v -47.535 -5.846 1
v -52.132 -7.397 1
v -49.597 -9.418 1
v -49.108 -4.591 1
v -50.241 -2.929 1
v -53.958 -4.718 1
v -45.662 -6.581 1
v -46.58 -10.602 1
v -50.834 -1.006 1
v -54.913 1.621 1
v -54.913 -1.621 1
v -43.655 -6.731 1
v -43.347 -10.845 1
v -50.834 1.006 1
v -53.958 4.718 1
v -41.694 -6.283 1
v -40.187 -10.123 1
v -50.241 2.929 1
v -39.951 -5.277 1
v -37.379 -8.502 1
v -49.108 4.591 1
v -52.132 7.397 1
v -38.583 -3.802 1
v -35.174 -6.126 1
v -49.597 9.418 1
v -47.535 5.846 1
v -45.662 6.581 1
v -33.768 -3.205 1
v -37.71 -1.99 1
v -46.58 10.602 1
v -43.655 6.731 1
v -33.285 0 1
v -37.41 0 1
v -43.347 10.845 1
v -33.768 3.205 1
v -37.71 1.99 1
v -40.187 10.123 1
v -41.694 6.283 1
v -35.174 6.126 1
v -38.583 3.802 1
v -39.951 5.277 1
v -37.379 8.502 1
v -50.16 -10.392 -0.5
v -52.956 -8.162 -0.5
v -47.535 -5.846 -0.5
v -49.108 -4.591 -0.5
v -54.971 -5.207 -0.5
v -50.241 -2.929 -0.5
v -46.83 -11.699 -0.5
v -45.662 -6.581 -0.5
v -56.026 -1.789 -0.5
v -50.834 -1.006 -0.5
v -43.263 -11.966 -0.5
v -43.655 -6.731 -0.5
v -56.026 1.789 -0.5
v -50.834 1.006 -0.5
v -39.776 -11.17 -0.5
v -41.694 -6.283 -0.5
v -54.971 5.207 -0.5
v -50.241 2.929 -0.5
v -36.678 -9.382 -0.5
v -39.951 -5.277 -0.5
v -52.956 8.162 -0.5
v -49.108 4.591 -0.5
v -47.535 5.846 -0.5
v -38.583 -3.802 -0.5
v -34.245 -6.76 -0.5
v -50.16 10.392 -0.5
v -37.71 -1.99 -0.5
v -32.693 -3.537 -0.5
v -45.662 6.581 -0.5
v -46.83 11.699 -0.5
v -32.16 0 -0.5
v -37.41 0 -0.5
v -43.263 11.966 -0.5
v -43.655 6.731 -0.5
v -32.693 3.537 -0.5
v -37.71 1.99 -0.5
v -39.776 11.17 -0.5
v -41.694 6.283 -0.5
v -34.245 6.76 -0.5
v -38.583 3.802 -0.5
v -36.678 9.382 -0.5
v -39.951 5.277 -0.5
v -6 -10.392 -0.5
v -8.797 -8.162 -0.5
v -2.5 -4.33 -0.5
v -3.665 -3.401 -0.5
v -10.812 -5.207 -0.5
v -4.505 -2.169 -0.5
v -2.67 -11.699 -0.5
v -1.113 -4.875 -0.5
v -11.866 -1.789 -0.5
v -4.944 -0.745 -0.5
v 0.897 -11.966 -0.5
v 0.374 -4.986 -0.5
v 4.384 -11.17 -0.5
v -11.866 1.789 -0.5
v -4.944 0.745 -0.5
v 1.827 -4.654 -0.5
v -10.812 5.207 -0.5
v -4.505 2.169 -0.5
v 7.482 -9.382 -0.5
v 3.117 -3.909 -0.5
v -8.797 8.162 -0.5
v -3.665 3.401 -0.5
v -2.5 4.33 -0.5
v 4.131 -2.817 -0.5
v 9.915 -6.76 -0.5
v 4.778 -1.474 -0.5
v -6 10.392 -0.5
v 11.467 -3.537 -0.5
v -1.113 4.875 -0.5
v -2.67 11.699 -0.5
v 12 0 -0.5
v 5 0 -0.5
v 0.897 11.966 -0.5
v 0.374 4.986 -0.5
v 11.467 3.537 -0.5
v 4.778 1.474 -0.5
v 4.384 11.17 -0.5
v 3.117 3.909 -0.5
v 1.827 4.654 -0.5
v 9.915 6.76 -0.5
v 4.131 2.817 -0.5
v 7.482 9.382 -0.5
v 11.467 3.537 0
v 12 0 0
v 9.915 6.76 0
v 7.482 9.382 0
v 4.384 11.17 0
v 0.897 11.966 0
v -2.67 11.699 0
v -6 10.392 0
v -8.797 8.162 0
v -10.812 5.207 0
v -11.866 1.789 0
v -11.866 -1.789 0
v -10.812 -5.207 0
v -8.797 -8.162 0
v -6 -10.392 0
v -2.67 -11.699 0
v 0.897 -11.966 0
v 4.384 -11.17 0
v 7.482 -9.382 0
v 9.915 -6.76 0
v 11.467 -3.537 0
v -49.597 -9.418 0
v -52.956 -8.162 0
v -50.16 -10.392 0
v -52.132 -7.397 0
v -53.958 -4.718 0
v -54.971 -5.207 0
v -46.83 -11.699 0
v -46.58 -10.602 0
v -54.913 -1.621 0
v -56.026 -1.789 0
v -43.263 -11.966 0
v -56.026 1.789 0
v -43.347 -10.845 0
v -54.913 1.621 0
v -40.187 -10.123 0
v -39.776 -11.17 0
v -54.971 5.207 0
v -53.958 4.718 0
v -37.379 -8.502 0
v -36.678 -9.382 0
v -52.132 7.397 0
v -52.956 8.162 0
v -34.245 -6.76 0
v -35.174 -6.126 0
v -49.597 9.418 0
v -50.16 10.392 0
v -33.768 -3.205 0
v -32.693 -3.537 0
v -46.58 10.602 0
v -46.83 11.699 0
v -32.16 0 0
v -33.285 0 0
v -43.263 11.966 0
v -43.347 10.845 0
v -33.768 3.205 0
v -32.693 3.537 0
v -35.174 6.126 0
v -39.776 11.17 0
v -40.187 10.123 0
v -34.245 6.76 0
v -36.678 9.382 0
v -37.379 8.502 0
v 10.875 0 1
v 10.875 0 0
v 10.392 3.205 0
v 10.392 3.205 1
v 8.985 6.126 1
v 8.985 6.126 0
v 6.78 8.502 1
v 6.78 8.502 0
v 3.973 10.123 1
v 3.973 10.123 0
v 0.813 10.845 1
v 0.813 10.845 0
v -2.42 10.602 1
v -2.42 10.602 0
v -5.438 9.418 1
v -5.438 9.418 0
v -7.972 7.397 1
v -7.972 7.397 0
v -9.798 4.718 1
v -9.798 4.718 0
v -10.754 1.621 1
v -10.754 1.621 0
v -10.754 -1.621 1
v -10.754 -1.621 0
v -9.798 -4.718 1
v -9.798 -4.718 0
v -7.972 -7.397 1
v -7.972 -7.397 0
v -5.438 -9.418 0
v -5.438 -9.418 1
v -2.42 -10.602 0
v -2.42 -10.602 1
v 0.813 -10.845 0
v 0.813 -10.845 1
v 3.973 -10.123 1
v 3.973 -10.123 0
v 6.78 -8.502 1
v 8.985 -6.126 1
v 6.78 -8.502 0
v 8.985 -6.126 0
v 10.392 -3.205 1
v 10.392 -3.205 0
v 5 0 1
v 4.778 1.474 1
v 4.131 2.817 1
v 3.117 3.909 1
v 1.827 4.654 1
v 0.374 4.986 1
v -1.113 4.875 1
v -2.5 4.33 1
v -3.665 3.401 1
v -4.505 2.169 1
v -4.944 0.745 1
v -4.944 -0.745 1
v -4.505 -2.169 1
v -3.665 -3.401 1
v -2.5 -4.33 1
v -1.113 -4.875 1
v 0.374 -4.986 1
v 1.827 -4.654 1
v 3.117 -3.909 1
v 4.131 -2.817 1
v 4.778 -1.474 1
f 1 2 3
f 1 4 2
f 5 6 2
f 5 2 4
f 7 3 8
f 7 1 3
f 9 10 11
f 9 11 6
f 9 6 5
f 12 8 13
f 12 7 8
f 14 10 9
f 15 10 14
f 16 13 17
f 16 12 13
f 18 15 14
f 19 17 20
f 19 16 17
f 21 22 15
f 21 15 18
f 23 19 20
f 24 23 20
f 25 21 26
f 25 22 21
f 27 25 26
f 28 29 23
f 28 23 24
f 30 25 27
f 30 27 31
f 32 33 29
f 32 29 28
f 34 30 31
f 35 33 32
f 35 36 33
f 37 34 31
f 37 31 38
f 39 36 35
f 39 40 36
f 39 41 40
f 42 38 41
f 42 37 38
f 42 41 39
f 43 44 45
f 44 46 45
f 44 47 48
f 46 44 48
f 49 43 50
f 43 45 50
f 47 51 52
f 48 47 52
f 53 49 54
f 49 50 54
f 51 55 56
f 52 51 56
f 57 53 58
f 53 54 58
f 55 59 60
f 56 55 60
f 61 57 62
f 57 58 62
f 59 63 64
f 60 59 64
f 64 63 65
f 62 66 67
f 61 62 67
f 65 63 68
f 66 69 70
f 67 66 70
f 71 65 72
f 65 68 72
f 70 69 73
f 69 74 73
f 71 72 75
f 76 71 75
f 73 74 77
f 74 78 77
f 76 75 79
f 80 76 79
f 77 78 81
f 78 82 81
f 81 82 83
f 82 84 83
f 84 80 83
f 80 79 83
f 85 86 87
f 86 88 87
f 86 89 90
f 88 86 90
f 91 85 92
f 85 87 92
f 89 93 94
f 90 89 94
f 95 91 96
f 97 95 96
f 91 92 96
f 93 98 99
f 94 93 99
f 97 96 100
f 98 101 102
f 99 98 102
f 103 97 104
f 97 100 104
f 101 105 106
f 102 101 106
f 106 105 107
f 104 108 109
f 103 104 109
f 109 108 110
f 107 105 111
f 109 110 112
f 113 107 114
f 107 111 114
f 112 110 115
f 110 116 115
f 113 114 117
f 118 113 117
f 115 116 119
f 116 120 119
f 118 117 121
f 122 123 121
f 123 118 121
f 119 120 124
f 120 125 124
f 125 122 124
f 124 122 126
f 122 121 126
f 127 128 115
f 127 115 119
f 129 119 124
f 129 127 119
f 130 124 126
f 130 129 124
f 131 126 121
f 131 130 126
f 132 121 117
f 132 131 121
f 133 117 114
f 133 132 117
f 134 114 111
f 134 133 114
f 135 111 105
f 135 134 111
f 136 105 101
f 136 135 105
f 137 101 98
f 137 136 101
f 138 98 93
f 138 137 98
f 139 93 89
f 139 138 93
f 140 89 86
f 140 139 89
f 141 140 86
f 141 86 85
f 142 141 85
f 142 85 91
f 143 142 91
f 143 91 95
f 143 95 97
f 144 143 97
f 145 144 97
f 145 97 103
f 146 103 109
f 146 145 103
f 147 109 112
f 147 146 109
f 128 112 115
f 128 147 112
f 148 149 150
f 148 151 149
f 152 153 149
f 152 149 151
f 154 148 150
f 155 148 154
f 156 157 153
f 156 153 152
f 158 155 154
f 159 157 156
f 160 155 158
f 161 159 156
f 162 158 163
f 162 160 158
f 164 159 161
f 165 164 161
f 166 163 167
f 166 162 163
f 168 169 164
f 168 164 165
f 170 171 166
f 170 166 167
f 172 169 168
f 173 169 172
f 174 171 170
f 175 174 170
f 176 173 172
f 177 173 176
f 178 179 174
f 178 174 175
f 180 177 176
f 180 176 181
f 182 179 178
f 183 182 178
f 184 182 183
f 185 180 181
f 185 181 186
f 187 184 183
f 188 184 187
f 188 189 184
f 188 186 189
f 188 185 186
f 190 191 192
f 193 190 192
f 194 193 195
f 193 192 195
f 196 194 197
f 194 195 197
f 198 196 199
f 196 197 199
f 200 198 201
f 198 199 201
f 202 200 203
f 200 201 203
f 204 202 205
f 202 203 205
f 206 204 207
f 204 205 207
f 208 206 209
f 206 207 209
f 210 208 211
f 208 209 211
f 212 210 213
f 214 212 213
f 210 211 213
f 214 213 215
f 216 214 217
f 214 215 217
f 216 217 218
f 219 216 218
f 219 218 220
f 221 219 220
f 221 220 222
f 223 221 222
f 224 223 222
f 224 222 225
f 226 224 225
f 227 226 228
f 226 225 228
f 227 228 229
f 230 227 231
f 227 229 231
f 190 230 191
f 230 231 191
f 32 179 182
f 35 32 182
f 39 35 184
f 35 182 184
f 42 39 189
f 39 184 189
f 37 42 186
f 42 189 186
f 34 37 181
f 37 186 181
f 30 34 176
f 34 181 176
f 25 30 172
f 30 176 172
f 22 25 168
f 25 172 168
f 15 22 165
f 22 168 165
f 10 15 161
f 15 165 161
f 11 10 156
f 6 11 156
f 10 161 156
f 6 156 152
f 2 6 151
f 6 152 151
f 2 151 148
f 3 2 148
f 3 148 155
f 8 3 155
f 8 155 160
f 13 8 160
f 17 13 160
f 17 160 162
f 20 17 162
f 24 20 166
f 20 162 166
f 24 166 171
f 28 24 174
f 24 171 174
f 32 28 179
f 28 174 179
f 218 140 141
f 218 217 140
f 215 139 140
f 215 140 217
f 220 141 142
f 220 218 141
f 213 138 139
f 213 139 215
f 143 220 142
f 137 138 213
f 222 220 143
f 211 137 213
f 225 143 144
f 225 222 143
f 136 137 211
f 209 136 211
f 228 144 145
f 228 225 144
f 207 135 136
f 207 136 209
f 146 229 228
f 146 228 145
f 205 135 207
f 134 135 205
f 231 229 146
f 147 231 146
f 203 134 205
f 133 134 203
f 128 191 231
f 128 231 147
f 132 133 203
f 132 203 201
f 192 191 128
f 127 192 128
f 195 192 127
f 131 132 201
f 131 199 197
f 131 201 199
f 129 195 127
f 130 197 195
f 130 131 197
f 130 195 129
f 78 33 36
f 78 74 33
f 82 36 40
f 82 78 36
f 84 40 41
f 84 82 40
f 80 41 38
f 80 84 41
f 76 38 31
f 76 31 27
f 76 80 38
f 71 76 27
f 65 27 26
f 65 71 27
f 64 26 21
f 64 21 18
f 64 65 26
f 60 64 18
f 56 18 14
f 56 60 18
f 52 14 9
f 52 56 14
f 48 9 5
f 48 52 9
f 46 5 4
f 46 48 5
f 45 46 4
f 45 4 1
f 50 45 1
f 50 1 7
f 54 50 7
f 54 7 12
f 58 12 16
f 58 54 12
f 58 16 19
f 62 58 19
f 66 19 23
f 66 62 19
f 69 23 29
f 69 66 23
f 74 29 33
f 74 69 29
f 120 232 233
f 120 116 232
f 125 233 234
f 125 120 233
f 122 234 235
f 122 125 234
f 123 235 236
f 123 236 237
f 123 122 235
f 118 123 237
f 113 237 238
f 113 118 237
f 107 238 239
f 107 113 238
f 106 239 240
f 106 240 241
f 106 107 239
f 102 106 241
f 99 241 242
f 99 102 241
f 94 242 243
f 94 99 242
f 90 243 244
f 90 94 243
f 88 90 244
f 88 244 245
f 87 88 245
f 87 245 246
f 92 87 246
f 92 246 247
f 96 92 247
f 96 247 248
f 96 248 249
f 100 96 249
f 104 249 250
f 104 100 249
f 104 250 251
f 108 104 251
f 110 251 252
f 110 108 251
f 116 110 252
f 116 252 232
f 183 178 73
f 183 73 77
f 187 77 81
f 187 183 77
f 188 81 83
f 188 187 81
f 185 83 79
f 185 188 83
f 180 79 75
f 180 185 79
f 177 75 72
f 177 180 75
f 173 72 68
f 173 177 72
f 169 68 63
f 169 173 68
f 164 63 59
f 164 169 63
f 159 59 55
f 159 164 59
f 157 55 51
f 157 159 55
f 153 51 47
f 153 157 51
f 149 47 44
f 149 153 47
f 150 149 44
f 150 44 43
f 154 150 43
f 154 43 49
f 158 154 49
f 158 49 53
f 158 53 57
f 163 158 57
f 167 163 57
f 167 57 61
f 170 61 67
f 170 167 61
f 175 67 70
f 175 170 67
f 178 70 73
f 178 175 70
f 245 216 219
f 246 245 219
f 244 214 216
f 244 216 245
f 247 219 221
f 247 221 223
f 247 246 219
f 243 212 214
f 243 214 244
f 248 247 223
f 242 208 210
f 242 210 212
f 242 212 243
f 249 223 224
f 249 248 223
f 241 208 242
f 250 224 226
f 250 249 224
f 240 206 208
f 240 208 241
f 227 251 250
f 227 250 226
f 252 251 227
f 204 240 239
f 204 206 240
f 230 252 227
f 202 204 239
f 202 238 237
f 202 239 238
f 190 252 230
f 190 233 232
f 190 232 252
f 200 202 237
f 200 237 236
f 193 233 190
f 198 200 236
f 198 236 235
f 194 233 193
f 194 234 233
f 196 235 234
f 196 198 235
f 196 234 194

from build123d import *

# Parameters (mm, degrees)
F0_R     = 12
F0_R_2   = 10.875
F0_R_3   = 5
F1_DEPTH = 0.5
F2_DEPTH = 1
F0_R_4   = 6.75
F3_DEPTH = 0.5
F4_DEPTH = 1


with BuildPart() as f1:
    # F0 (on Top) → F1 (new body)
    with BuildSketch(Plane.XY):
        Circle(F0_R)
        Circle(F0_R_2, mode=Mode.SUBTRACT)
        Circle(F0_R_2)
        Circle(F0_R_3, mode=Mode.SUBTRACT)
    extrude(amount=-F1_DEPTH)

    # F0 (on Top) → F2 (join)
    with BuildSketch(Plane.XY):
        Circle(F0_R_2)
        Circle(F0_R_3, mode=Mode.SUBTRACT)
    extrude(amount=F2_DEPTH)


with BuildPart() as f3:
    # F0 (on Top) → F3 (new body)
    with BuildSketch(Plane.XY):
        with Locations((-44.1597141325, 0)):
            Circle(F0_R)
        with Locations((-44.1597141325, 0)):
            Circle(F0_R_2, mode=Mode.SUBTRACT)
        with Locations((-44.1597141325, 0)):
            Circle(F0_R_2)
        with Locations((-44.1597141325, 0)):
            Circle(F0_R_4, mode=Mode.SUBTRACT)
    extrude(amount=-F3_DEPTH)

    # F0 (on Top) → F4 (join)
    with BuildSketch(Plane.XY):
        with Locations((-44.1597141325, 0)):
            Circle(F0_R_2)
        with Locations((-44.1597141325, 0)):
            Circle(F0_R_4, mode=Mode.SUBTRACT)
    extrude(amount=F4_DEPTH)


solid = Compound([f1.part, f3.part])
